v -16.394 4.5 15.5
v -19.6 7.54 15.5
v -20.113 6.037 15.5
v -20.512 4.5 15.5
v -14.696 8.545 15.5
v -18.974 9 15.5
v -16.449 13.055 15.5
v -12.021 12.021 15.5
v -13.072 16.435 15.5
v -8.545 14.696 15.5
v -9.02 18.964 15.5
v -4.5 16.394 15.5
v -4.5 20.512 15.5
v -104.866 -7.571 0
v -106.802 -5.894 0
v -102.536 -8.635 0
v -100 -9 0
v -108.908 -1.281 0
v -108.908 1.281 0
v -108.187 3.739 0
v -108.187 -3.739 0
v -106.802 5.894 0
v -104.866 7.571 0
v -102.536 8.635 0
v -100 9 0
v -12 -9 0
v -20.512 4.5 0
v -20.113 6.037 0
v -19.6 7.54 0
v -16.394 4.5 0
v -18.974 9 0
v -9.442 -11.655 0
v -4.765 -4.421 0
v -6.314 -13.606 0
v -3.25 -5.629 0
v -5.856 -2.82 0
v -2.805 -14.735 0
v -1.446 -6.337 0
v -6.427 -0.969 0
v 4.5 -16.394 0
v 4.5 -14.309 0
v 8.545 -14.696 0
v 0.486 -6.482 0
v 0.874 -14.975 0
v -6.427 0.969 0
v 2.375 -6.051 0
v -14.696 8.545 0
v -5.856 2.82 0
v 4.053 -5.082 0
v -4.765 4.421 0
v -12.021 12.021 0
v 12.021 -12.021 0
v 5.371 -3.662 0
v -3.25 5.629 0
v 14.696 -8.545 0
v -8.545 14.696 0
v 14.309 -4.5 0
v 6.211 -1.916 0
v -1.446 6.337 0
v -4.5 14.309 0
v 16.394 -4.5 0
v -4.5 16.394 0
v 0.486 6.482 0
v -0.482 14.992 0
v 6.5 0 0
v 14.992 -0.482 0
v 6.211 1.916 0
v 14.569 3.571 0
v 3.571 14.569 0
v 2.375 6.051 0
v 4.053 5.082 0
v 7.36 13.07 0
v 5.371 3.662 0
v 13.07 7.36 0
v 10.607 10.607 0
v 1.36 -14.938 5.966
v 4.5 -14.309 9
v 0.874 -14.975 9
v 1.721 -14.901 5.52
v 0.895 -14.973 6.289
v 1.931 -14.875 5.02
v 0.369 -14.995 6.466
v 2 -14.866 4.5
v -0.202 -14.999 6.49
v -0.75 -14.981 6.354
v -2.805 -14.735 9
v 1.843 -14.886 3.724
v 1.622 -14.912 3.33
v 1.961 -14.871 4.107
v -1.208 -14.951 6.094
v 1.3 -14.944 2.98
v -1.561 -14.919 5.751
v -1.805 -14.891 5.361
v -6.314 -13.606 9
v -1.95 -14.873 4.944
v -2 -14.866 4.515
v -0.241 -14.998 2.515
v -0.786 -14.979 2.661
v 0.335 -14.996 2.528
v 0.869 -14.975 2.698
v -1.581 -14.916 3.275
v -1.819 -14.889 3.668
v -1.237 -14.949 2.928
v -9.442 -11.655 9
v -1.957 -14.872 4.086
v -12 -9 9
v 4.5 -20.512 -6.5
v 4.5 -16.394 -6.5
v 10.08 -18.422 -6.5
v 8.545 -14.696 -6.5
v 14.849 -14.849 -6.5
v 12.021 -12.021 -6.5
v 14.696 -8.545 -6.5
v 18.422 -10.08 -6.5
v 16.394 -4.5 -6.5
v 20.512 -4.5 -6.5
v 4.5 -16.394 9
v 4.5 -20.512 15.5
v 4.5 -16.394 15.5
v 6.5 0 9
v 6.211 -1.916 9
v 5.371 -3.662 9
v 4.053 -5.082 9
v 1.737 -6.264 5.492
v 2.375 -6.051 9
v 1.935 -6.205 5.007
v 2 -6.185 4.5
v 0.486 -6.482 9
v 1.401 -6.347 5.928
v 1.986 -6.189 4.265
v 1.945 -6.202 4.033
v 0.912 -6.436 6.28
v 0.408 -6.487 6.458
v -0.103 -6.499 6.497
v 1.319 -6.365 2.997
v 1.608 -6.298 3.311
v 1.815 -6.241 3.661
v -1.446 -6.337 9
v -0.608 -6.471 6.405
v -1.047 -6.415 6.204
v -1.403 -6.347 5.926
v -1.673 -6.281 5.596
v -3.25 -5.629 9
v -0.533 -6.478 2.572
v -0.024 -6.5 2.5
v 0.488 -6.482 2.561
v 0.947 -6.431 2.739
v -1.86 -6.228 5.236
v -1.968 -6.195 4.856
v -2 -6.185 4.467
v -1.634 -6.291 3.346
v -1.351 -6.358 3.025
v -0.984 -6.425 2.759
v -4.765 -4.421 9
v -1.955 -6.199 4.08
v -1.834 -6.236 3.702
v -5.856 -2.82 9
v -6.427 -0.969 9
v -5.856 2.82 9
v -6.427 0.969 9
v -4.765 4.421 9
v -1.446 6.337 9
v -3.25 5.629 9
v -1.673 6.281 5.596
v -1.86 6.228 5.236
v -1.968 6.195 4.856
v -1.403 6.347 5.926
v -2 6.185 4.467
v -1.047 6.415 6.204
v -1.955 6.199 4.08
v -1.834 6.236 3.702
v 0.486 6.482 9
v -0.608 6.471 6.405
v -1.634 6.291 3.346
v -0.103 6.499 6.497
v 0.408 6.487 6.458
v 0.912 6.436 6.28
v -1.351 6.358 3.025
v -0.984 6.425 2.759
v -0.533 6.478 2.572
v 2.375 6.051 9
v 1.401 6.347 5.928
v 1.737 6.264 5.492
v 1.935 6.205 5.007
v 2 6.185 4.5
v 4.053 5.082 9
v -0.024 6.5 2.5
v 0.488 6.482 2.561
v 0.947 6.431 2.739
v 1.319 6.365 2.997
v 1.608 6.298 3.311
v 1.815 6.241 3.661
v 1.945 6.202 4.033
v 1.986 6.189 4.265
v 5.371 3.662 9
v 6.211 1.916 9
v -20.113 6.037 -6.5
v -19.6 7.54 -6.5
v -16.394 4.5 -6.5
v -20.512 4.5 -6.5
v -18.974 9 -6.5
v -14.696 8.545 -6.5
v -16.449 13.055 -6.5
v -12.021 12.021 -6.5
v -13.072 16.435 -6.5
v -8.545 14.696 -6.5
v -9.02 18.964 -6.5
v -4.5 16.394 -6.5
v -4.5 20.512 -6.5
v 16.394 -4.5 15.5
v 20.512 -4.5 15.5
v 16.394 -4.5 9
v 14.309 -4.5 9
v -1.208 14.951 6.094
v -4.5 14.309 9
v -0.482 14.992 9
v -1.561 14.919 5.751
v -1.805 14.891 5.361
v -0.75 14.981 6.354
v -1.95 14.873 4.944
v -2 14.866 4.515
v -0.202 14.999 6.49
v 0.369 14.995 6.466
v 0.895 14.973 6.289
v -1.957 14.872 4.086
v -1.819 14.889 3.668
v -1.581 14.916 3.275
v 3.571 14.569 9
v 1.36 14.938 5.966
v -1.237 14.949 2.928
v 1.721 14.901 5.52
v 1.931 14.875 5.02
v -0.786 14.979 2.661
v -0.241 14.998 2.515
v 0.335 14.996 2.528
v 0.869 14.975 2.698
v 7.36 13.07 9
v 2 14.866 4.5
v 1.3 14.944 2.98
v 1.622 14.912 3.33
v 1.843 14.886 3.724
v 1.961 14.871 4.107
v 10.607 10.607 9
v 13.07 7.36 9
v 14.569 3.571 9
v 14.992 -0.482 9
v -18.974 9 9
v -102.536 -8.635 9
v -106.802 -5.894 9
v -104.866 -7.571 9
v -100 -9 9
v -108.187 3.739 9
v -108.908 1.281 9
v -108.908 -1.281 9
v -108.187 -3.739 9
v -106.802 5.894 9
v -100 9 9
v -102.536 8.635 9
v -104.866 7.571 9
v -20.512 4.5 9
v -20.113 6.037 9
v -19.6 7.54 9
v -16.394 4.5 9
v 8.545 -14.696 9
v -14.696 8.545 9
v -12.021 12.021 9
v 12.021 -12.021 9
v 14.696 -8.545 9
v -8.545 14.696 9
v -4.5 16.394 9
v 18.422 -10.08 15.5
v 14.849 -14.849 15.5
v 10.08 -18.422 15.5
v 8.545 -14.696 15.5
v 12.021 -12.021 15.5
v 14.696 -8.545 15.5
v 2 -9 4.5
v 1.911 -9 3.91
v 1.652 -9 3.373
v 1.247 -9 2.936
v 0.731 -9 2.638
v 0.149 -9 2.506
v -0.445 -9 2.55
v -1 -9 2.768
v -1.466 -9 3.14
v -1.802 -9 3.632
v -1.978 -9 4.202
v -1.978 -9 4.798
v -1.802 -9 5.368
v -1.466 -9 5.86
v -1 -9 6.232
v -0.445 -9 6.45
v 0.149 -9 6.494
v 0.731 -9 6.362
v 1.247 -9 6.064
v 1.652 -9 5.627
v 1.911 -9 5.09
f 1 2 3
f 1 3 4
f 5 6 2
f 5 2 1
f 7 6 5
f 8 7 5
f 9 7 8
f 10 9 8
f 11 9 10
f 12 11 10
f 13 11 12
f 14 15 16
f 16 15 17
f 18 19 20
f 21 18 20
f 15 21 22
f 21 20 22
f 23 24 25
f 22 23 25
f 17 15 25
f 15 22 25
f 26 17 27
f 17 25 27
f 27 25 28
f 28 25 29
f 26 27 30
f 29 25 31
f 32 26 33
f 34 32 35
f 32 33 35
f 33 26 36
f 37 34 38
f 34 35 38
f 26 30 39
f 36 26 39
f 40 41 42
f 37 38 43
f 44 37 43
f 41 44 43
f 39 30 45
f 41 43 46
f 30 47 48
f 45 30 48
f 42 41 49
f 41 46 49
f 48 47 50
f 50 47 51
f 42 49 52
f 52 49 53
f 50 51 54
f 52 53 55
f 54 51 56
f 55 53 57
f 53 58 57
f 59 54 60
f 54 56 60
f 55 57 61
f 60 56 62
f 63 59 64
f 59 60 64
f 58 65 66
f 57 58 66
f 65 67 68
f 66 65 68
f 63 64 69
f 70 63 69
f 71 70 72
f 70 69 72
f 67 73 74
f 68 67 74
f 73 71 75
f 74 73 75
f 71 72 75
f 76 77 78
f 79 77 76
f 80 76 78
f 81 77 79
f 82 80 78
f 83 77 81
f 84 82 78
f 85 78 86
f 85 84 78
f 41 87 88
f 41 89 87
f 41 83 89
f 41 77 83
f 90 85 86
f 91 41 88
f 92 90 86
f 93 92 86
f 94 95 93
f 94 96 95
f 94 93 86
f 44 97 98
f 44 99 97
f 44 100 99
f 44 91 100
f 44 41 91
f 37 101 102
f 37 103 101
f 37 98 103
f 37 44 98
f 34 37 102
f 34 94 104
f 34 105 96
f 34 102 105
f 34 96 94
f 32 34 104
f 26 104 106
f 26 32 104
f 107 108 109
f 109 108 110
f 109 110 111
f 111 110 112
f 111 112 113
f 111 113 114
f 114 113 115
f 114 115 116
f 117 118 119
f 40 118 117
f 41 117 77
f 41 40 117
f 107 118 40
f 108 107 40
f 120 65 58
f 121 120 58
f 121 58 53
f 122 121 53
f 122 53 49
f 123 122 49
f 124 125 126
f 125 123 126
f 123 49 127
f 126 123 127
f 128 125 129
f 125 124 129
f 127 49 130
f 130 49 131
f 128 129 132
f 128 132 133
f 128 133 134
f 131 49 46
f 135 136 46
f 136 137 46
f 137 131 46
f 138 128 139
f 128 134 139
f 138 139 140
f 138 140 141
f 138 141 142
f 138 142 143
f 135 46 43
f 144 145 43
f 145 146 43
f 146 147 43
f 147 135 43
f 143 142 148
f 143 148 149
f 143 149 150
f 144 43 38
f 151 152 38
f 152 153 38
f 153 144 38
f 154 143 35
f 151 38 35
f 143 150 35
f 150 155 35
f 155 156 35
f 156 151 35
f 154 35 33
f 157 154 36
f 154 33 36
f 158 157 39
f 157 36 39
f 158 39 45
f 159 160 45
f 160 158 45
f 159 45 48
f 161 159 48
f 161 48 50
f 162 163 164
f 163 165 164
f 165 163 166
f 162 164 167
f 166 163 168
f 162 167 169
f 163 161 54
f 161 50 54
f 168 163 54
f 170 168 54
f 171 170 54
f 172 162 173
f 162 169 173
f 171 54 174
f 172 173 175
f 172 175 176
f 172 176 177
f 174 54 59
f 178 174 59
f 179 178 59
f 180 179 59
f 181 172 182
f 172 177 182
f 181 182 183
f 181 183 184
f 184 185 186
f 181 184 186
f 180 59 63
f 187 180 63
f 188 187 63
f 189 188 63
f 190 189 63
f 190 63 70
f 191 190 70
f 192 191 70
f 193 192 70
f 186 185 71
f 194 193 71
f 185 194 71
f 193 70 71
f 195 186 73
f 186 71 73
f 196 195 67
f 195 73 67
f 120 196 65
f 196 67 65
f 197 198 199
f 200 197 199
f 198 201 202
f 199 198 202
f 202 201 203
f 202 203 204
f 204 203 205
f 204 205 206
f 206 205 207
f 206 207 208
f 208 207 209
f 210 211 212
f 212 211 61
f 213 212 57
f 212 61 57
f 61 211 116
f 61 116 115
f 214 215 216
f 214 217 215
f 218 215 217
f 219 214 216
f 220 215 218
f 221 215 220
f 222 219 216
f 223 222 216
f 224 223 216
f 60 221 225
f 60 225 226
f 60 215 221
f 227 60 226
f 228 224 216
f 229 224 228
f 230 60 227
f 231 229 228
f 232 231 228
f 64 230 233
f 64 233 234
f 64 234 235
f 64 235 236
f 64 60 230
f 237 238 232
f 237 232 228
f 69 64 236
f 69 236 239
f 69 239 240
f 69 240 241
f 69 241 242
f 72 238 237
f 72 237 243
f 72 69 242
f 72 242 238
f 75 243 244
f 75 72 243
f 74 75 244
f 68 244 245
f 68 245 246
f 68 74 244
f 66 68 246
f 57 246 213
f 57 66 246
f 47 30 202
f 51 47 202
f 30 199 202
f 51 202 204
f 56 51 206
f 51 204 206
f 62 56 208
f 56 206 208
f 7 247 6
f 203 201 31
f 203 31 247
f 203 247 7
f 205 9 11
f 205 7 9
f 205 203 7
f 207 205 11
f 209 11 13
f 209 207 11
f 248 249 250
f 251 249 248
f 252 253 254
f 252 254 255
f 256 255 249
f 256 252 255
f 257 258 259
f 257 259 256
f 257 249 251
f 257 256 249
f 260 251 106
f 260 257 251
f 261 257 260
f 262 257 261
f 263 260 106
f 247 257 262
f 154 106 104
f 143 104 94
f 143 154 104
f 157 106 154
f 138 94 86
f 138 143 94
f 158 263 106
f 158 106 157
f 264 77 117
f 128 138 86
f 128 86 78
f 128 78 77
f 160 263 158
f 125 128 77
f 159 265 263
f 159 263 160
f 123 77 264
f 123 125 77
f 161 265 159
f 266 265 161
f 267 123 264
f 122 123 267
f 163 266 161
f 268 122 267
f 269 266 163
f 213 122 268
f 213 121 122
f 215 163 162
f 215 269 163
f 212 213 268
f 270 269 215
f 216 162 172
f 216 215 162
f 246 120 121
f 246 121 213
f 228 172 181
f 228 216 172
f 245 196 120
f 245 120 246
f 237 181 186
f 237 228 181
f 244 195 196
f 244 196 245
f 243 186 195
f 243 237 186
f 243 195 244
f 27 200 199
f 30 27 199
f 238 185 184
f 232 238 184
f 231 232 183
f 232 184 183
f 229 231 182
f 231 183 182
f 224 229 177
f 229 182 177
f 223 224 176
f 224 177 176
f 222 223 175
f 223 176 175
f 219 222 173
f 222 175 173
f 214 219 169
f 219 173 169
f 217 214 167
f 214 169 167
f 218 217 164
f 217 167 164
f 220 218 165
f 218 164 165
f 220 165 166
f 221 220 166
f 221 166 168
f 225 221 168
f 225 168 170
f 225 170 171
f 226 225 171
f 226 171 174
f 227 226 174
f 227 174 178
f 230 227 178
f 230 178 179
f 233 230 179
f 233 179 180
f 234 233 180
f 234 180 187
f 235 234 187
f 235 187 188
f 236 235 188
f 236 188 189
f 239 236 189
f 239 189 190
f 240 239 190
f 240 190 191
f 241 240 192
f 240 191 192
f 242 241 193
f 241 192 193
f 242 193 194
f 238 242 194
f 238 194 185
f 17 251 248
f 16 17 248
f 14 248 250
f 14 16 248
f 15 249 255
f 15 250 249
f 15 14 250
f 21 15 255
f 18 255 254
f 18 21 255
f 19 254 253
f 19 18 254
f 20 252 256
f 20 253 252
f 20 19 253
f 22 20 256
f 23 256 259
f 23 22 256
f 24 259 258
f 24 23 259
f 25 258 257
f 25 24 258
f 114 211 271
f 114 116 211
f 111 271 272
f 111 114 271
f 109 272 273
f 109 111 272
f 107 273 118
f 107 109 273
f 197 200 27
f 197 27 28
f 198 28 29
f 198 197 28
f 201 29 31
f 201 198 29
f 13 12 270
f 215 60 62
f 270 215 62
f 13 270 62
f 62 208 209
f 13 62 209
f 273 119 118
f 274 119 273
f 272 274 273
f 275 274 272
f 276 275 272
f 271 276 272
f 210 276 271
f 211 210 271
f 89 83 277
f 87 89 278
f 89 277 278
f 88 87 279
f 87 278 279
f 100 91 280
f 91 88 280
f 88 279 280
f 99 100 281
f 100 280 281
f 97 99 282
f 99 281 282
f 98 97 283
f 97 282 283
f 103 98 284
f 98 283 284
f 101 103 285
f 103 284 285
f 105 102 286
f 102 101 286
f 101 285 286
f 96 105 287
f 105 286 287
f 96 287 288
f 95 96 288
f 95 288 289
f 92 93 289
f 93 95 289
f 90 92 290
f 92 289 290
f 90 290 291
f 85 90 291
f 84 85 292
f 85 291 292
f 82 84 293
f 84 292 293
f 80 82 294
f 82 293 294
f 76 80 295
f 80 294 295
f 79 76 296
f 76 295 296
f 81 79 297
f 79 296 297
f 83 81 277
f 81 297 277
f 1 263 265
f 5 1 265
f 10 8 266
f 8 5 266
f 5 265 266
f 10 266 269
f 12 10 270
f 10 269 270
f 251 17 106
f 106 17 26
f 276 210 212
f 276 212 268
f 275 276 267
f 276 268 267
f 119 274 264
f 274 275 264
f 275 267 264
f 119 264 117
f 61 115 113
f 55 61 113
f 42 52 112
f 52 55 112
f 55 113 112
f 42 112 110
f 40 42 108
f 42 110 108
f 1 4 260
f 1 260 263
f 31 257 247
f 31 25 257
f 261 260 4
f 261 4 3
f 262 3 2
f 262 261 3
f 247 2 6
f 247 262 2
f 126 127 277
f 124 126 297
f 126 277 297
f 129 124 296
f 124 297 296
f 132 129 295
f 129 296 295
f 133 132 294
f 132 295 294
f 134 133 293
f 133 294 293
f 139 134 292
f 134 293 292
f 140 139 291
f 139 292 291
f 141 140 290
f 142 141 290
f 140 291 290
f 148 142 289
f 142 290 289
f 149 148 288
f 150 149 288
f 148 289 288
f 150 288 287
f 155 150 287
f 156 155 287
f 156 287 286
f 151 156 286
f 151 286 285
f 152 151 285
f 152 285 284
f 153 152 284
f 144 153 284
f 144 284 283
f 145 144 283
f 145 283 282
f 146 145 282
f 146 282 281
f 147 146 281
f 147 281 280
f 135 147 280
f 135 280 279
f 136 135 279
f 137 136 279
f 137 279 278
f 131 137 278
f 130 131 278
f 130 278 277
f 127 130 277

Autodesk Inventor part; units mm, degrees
ref_plane "YZ Plane" through (0, 0, 0) normal (1, 0, 0) x (0, 1, 0)
ref_plane "XZ Plane" through (0, 0, 0) normal (0, 1, 0) x (-1, 0, 0)
ref_plane "XY Plane" through (0, 0, 0) normal (0, 0, 1) x (1, 0, 0)
sketch "Sketch1" plane through (0, 0, 0) normal (0, 0, 1) x (1, 0, 0)
  circle A0 centre (0, 0) radius 6.5
  circle A1 centre (0, 0) radius 15
  arc A2 (-18.9737, 9) -> (-20.5122, 4.5) centre (0, 0) ccw
  arc A3 (-14.4222, -9) -> (-16.3936, 4.5) centre (0, 0) ccw
  line L0 (0, 17) -> (-4.5, 17) construction
  line L1 (17, 0) -> (17, -4.5) construction
  line L2 (16.3936, -4.5) -> (14.3091, -4.5)
  line L3 (0, -17) -> (4.5, -17) construction
  line L4 (4.5, -16.3936) -> (4.5, -14.3091)
  line L5 (-17, 0) -> (-17, 4.5) construction
  line L6 (-17, 4.5) -> (-14.3091, 4.5)
  line L7 (0, 0) -> (-100, 0) construction
  arc A4 (-100, 9) -> (-100, -9) centre (-100, 0) ccw
  line L8 (-100, -9) -> (-12, -9)
  line L9 (-100, 9) -> (-18.9737, 9)
  line L10 (-14.4222, 9) -> (-12, 9)
  line L11 (-17, 4.5) -> (-20.5122, 4.5)
  line L12 (-4.5, 16.3936) -> (-4.5, 14.3091)
  line L13 (-4.5, 16.3936) -> (-4.5, 17) construction
  line L14 (17, -4.5) -> (16.3936, -4.5) construction
  line L15 (4.5, -17) -> (4.5, -16.3936) construction
  circle A5 centre (0, 0) radius 21
  line L16 (-4.5, 16.3936) -> (-4.5, 20.5122)
  line L17 (4.5, -16.3936) -> (4.5, -20.5122)
  line L18 (16.3936, -4.5) -> (20.5122, -4.5)
  dimension "d3" = 34
  dimension "d0" = 13
  dimension "d1" = 30
  dimension "d2" = 42
  dimension "d4" = 4.5
  dimension "d5" = 4.5
  dimension "d6" = 4.5
  dimension "d7" = 4.5
  dimension "d8" = 100
  dimension "d9" = 9
extrude "Extrusion1" add sketch "Sketch1" along normal blind 9 contours A1 | A1 L10 A3 L12 | L2 A3 L4 A1 | A1 L6 A3 L10 | A1 L8 A5 L11 L6 | A2 A5 L8 A4 L9
extrude "Extrusion2" add sketch "Sketch1" along normal blind 15.5 and the other way blind 6.5 contours A3 L6 L11 A2 A5 L16 | L18 A5 L17 A3
sketch "Sketch2" plane through (-100, -9, 0) normal (0, -1, 0) x (1, 0, 0)
  line L0 (0, 0) -> (134.8199, 0) construction
  line L1 (100, 0) -> (100, -17.6353) construction
  line L2 (100, 0) -> (104.5, 0) construction
  line L3 (115, 0) -> (95.5, 0) construction
  line L4 (100, 0) -> (100, 4.5) construction
  circle A0 centre (100, 4.5) radius 2
  point P0 (114.3091, 0)
  dimension "d25" = 4.5
  dimension "d26" = 4.5
  dimension "d27" = 4
extrude "Extrusion3" cut sketch "Sketch2" along normal mid plane 89
equation "\"d5\" = d4"
equation "\"d6\" = d4"
equation "\"d7\" = d4"
properties part number "Handle" material "Steel, Mild"
